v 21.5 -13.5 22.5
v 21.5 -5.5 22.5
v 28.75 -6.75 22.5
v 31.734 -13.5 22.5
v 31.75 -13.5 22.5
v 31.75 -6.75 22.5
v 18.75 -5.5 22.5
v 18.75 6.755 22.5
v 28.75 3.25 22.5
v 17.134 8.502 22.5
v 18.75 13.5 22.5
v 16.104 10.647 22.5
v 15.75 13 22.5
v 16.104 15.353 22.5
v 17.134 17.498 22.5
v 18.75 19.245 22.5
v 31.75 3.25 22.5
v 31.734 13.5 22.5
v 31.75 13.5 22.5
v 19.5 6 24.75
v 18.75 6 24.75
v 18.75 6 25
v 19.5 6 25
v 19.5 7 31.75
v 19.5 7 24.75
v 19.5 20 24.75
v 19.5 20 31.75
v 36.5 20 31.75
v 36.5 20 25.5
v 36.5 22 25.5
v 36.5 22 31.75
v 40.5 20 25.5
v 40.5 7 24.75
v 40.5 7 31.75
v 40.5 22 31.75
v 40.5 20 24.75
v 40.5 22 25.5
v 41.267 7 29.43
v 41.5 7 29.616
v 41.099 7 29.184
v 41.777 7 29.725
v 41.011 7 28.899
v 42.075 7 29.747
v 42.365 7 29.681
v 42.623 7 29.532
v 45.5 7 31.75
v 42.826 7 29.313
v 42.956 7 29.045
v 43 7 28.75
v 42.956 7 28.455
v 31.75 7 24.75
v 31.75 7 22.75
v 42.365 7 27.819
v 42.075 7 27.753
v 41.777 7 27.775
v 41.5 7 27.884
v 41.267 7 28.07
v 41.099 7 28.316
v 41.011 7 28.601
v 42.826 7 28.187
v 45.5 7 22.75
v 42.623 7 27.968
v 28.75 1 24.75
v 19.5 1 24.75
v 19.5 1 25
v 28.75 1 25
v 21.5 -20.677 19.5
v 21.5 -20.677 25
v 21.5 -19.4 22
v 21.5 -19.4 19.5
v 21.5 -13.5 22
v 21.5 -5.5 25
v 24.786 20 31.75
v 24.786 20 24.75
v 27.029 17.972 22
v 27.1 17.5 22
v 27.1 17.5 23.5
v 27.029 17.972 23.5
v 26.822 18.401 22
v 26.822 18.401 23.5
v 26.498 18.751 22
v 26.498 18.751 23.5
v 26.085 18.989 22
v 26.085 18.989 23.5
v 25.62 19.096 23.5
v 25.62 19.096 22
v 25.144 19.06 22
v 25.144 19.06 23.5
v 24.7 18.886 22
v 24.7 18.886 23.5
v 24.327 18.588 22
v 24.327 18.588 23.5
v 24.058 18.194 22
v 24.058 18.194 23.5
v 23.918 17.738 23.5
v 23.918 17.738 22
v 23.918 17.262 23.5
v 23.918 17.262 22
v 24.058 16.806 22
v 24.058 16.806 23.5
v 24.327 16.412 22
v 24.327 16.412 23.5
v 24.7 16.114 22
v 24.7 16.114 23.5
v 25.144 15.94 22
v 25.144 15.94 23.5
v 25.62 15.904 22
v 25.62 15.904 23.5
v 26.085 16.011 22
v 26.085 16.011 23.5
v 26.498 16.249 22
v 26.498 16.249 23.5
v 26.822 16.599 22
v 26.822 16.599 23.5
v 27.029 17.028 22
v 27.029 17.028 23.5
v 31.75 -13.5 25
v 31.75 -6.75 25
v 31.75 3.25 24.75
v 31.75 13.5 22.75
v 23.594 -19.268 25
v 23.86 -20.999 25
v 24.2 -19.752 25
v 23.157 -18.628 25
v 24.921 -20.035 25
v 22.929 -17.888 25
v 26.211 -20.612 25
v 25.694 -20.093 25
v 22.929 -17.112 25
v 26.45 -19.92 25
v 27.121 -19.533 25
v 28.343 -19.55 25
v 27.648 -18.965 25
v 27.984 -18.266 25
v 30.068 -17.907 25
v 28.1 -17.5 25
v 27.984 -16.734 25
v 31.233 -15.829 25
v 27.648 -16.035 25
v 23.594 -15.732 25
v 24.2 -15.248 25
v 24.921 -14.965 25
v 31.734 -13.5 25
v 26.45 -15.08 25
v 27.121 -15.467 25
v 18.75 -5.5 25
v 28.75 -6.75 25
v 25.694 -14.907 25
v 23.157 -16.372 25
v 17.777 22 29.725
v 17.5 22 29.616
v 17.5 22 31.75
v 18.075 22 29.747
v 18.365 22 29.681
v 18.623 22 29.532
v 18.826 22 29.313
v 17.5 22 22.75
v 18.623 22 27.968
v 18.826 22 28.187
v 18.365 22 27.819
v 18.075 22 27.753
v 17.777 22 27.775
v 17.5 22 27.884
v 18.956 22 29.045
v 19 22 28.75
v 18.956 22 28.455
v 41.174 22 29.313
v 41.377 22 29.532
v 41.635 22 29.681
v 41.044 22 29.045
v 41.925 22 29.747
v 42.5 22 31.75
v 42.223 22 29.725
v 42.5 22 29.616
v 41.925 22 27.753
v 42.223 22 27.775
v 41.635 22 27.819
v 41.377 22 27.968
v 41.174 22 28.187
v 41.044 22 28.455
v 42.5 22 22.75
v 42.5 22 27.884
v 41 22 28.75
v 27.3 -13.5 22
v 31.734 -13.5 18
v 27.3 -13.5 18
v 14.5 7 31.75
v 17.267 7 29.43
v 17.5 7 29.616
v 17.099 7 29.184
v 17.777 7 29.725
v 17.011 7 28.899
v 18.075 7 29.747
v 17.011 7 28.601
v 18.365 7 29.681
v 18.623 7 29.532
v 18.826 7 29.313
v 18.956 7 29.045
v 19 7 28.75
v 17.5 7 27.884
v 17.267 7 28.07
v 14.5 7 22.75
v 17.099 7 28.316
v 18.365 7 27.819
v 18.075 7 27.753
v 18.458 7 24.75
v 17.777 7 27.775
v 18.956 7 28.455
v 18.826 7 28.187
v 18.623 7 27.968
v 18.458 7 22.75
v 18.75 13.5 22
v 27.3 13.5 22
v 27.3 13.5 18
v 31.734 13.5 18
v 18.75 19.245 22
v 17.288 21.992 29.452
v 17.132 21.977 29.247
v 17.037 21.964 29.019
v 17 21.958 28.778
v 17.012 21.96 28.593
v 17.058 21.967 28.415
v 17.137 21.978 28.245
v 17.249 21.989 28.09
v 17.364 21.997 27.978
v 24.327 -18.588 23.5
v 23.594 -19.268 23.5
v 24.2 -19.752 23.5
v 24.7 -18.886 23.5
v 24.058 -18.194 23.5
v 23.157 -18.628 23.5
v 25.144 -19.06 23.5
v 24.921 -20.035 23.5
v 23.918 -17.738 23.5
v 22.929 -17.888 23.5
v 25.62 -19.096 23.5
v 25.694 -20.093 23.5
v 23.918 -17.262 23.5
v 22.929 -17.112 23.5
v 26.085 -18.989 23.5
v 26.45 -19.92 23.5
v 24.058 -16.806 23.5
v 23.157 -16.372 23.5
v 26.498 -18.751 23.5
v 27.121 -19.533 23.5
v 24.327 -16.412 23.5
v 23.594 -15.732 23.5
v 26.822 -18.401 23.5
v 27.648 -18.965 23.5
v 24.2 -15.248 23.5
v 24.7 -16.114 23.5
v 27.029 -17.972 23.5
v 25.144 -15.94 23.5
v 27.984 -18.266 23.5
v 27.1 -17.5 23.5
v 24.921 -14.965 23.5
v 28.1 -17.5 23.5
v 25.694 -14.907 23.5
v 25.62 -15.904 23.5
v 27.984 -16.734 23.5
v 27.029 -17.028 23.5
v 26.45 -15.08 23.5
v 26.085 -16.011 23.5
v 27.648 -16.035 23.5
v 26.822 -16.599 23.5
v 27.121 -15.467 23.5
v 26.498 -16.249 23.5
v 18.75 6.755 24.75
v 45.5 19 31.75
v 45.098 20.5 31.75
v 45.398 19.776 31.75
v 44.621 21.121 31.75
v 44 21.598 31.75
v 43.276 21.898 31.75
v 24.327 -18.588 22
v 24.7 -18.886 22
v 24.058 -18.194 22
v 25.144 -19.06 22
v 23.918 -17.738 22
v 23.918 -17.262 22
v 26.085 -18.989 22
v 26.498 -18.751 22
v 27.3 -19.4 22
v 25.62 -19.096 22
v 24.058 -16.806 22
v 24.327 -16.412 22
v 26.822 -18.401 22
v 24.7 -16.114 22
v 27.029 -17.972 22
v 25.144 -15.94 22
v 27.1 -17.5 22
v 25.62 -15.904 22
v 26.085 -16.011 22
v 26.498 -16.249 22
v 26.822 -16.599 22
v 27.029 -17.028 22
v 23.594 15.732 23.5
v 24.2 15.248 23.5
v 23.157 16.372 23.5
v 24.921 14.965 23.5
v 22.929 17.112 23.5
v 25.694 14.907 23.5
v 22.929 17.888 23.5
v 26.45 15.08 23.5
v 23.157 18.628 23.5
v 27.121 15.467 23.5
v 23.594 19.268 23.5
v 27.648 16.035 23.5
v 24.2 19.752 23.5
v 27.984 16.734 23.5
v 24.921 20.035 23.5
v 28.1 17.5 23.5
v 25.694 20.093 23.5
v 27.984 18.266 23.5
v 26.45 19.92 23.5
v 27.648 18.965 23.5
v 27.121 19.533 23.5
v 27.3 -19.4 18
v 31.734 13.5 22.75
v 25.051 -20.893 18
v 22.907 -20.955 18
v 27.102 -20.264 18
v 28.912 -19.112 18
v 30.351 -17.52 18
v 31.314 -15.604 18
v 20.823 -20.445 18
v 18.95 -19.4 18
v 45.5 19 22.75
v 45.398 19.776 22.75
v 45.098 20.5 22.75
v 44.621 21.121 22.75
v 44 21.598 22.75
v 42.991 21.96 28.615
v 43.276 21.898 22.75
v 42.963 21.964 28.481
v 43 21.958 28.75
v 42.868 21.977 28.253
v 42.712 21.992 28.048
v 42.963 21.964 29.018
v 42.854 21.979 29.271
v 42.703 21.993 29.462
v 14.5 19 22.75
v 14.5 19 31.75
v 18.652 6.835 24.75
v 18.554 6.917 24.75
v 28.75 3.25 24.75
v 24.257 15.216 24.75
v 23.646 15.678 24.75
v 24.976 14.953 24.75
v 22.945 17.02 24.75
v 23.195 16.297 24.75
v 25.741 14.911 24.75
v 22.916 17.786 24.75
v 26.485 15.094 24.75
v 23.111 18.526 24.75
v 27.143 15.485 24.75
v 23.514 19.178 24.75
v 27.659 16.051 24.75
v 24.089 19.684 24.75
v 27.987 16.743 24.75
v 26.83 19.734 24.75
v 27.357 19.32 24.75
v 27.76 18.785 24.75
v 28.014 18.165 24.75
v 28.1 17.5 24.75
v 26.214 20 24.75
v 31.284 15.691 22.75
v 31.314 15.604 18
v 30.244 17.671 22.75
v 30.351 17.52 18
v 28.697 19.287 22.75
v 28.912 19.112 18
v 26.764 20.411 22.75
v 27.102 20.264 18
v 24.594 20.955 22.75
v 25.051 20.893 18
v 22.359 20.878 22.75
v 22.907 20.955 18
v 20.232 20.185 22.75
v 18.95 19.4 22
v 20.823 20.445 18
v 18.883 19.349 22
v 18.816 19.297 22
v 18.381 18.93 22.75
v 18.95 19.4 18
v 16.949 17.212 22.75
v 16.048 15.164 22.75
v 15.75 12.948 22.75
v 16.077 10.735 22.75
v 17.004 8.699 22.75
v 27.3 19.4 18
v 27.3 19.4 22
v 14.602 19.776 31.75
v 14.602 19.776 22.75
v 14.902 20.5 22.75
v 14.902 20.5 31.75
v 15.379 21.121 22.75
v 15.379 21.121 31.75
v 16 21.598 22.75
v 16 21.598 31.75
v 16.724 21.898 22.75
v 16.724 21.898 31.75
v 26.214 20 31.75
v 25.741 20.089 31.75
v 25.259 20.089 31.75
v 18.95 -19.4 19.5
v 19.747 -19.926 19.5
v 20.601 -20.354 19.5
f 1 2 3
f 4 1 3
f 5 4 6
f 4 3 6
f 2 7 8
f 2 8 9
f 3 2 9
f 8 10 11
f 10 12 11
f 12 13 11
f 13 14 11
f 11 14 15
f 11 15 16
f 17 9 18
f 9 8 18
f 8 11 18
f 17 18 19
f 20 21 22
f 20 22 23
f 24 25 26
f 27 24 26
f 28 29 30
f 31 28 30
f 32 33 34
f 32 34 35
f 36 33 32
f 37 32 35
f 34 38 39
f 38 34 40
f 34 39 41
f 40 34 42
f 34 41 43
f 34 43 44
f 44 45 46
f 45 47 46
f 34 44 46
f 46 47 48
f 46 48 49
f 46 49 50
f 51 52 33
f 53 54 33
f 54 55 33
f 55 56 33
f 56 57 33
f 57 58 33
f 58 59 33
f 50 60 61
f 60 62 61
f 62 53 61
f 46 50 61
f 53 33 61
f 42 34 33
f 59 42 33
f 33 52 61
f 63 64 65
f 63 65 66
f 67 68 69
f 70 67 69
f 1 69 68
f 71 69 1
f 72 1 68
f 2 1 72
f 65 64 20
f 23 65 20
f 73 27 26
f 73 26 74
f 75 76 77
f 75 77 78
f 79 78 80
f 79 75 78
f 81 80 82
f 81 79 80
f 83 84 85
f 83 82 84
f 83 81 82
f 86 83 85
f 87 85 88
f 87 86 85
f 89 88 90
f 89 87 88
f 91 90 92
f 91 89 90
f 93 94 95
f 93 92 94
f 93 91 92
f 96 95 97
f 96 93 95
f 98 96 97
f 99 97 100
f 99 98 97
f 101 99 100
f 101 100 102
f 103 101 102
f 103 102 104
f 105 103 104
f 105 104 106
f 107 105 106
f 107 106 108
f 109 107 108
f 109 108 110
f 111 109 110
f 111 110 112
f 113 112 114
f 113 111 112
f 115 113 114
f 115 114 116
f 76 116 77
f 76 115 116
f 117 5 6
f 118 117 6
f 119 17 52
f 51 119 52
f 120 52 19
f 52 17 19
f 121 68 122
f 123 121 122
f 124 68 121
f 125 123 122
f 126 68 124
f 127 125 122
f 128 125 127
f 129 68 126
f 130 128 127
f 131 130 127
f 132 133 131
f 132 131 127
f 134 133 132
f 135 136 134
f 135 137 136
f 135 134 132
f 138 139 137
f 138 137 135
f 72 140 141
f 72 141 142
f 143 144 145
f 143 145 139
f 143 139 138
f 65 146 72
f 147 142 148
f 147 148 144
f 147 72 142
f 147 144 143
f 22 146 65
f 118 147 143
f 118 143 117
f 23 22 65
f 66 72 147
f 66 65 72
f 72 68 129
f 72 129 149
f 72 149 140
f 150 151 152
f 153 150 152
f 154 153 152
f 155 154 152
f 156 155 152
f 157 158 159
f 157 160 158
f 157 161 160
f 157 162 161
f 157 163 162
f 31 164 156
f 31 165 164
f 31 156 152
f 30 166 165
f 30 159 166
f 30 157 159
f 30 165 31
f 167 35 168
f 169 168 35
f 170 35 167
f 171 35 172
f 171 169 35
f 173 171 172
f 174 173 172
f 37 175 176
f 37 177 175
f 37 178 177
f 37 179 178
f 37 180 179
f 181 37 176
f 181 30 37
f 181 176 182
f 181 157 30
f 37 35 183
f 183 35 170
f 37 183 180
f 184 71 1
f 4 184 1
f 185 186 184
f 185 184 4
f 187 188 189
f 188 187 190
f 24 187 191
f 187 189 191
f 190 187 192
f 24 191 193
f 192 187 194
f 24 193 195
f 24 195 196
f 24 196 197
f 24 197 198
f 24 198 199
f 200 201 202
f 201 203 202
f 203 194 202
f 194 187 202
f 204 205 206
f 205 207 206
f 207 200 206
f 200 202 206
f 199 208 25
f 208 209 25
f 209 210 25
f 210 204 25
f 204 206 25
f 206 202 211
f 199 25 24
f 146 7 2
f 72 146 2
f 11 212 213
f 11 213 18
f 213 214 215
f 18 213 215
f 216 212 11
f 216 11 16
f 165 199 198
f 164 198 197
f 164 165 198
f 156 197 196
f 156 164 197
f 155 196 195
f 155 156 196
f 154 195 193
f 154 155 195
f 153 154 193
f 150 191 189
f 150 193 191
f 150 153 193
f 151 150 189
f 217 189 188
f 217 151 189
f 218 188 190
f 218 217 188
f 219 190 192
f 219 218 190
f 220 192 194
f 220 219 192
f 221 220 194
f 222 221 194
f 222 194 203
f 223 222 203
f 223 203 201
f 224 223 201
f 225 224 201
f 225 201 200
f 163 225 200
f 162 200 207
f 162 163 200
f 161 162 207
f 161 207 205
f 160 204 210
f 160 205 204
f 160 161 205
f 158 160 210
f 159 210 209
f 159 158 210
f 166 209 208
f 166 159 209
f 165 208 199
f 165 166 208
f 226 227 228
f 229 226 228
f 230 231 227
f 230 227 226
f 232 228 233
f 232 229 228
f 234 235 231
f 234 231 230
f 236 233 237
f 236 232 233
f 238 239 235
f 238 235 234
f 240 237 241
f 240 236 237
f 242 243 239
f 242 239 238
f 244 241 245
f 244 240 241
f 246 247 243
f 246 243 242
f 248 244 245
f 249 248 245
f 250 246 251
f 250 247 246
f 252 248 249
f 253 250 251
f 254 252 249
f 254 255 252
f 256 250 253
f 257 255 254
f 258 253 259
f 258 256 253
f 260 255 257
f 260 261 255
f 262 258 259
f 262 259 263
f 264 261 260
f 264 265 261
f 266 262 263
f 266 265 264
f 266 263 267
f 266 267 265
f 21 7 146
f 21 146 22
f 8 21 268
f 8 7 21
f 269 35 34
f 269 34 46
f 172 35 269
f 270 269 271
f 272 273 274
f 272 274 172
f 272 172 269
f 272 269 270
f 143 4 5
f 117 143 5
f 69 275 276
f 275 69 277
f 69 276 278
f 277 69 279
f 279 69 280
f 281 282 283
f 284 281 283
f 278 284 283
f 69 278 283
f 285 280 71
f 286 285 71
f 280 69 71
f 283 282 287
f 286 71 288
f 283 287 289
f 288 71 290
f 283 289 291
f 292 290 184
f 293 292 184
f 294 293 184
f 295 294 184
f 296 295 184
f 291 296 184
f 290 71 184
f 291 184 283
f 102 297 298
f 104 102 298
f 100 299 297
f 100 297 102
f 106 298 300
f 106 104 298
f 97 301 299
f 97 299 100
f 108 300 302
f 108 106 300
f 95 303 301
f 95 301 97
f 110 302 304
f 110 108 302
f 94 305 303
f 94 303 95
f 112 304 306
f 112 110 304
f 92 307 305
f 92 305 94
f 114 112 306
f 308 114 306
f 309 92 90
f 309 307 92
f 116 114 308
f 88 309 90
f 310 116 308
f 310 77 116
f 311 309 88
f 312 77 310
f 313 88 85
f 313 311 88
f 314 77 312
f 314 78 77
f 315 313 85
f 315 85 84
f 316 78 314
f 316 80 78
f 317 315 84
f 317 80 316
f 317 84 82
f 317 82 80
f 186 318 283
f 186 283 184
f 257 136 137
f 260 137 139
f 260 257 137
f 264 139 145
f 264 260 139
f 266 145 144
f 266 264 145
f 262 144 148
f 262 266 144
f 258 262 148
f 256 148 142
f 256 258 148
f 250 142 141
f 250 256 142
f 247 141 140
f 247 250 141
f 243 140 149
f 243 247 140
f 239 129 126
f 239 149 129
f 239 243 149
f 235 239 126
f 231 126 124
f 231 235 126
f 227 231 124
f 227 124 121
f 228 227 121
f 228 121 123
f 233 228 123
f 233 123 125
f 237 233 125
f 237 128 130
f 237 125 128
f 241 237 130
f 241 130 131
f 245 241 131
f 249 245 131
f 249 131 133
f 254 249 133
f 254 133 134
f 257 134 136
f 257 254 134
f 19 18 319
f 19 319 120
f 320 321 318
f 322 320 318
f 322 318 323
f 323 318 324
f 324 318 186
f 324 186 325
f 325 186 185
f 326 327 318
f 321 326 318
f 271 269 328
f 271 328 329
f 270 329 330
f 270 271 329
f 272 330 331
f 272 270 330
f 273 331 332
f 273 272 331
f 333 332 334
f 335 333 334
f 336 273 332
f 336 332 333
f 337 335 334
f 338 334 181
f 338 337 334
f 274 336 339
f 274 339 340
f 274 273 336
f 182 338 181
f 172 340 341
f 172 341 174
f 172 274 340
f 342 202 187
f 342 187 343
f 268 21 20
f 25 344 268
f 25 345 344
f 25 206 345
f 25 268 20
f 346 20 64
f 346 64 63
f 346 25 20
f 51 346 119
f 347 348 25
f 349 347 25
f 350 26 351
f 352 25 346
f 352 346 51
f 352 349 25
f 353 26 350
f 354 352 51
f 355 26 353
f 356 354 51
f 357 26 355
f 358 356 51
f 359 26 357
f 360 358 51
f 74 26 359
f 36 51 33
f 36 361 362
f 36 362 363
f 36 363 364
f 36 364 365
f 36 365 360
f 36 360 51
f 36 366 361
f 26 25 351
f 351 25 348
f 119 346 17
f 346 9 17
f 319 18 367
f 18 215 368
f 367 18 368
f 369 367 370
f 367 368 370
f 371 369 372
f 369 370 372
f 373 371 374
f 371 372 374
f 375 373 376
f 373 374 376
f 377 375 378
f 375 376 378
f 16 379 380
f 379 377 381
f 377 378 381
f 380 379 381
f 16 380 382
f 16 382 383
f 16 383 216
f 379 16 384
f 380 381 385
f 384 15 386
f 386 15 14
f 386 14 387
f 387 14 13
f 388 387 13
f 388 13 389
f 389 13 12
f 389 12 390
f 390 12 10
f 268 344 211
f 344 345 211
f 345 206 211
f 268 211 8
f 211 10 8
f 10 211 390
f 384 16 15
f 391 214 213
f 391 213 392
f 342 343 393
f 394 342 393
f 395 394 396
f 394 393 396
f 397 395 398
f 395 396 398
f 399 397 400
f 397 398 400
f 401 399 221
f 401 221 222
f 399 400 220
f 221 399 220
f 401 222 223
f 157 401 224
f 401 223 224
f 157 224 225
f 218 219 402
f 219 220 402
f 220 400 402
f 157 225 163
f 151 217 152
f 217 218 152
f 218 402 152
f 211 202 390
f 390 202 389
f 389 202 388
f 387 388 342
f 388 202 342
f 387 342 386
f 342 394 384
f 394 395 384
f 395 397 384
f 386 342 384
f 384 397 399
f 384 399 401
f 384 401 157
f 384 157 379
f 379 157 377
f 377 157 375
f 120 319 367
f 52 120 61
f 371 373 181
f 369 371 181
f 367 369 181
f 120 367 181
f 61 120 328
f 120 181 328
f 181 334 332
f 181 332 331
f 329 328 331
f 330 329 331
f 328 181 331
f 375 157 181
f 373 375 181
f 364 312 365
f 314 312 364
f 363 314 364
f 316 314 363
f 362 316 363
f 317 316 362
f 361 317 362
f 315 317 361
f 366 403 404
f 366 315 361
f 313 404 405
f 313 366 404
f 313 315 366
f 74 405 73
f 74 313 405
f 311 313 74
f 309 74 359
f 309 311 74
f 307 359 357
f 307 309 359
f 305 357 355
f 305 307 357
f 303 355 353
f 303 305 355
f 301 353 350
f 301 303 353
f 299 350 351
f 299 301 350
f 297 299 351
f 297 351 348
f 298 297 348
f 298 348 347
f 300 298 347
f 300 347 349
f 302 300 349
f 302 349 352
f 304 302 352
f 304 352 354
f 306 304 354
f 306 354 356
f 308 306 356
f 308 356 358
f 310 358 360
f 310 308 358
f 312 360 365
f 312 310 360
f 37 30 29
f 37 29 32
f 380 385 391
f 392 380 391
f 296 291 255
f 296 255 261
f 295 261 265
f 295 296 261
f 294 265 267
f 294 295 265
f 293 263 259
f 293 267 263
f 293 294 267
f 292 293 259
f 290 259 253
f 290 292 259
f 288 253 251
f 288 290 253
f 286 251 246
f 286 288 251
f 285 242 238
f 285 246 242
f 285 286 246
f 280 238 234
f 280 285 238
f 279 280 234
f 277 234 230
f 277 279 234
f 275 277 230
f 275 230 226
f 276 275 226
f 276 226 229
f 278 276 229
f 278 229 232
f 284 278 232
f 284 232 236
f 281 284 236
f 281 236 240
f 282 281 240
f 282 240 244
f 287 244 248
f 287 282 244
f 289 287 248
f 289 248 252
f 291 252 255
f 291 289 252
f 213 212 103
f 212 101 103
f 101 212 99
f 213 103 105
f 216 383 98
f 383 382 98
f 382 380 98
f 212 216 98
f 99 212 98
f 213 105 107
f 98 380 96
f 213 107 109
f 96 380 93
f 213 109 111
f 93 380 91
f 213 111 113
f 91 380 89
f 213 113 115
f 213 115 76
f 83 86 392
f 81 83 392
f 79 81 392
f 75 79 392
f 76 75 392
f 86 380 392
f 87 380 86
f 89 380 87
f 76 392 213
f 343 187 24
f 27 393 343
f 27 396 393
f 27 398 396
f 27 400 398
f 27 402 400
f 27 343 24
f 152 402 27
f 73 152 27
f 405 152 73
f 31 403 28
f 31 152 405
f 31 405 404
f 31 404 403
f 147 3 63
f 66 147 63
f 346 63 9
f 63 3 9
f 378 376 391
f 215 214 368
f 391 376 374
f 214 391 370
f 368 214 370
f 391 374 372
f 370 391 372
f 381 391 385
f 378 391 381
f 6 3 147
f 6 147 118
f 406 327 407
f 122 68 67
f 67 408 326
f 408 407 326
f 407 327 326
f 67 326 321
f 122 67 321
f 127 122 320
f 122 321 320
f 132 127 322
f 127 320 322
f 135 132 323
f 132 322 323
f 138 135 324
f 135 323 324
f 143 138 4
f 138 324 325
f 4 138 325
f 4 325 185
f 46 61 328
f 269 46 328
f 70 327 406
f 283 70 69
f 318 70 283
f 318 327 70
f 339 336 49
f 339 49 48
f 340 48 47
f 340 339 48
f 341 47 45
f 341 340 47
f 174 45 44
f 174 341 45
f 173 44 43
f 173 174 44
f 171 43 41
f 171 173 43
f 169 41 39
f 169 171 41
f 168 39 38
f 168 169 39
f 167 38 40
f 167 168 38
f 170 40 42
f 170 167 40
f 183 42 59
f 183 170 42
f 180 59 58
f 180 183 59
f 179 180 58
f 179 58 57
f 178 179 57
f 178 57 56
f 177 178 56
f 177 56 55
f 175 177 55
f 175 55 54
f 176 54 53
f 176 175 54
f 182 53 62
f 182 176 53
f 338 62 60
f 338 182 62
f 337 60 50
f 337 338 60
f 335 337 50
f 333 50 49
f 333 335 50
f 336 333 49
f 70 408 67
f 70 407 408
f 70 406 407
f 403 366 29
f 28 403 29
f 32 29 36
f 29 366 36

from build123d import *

# Parameters (mm, degrees)
CYLINDER298_R     = 1
CYLINDER298_DEPTH = 20
CYLINDER299_R     = 1
CYLINDER299_DEPTH = 20
BOX220_W          = 28
BOX220_H          = 1
BOX220_DEPTH      = 8
BOX197_W          = 21
BOX197_H          = 19
BOX197_DEPTH      = 8
BOX221_W          = 18
BOX221_H          = 27
BOX221_DEPTH      = 5.5
CYLINDER296_R     = 1.6
CYLINDER296_DEPTH = 10
CYLINDER297_R     = 1.6
CYLINDER297_DEPTH = 10
BOX224_W          = 69.8
BOX224_H          = 38.8
BOX224_DEPTH      = 4
CYLINDER300_R     = 2.6
CYLINDER300_DEPTH = 10
CYLINDER301_R     = 2.6
CYLINDER301_DEPTH = 10
BOX226_W          = 11
BOX226_H          = 17
BOX226_DEPTH      = 6
BOX227_W          = 4
BOX227_H          = 8
BOX227_DEPTH      = 11
BOX232_W          = 10
BOX232_H          = 10
BOX232_DEPTH      = 10
BOX222_W          = 10
BOX222_H          = 44
BOX222_DEPTH      = 3
CYLINDER295_R     = 8
CYLINDER295_DEPTH = 7
CYLINDER294_R     = 8
CYLINDER294_DEPTH = 7
BOX225_W          = 31
BOX225_H          = 15
BOX225_DEPTH      = 9
FILLET121_R       = 3
BOX223_W          = 13
BOX223_H          = 27
BOX223_DEPTH      = 2.5


with BuildPart() as zylinder300:
    # Cylinder298 → Cylinder298 (new body)
    with BuildSketch(Plane(origin=(22.5, 23, 30.5), x_dir=(1, 0, 0), z_dir=(0, -1, 0))):
        Circle(CYLINDER298_R)
    extrude(amount=CYLINDER298_DEPTH)


with BuildPart() as zylinder301:
    # Cylinder299 → Cylinder299 (new body)
    with BuildSketch(Plane(origin=(-1.5, 23, 30.5), x_dir=(1, 0, 0), z_dir=(0, -1, 0))):
        Circle(CYLINDER299_R)
    extrude(amount=CYLINDER299_DEPTH)


with BuildPart() as w_rfel208:
    # Box220 → Box220 (new body)
    with BuildSketch(Plane(origin=(-3, 5, 26.5), x_dir=(1, 0, 0), z_dir=(0, 0, 1))):
        with Locations((14, 0.5)):
            Rectangle(BOX220_W, BOX220_H)
    extrude(amount=BOX220_DEPTH)


with BuildPart() as fusion207:
    # Box197 → Box197 (new body)
    with BuildSketch(Plane.XY.offset(26.5)):
        with Locations((10.5, 9.5)):
            Rectangle(BOX197_W, BOX197_H)
    extrude(amount=BOX197_DEPTH)

    # Fusion206: union Würfel208
    add(w_rfel208.part)

    # Fusion207: union Zylinder300, Zylinder301
    add(zylinder300.part)
    add(zylinder301.part)


with BuildPart() as fusion207_1:
    # Fusion207 placement: moved
    add(fusion207.part.moved(Location((19.5, 1, -3.75))))


with BuildPart() as w_rfel209:
    # Box221 → Box221 (new body)
    with BuildSketch(Plane(origin=(14.5, -13.5, 15), x_dir=(1, 0, 0), z_dir=(0, 0, 1))):
        with Locations((9, 13.5)):
            Rectangle(BOX221_W, BOX221_H)
    extrude(amount=BOX221_DEPTH)


with BuildPart() as zylinder298:
    # Cylinder296 → Cylinder296 (new body)
    with BuildSketch(Plane(origin=(25.5, -17.5, 12.25), x_dir=(1, 0, 0), z_dir=(0, 0, 1))):
        Circle(CYLINDER296_R)
    extrude(amount=CYLINDER296_DEPTH)


with BuildPart() as zylinder299:
    # Cylinder297 → Cylinder297 (new body)
    with BuildSketch(Plane(origin=(25.5, 17.5, 13), x_dir=(1, 0, 0), z_dir=(0, 0, 1))):
        Circle(CYLINDER297_R)
    extrude(amount=CYLINDER297_DEPTH)


with BuildPart() as board005:
    # Box224 → Box224 (new body)
    with BuildSketch(Plane(origin=(-42.5, -19.4, 16), x_dir=(1, 0, 0), z_dir=(0, 0, 1))):
        with Locations((34.9, 19.4)):
            Rectangle(BOX224_W, BOX224_H)
    extrude(amount=BOX224_DEPTH)


with BuildPart() as zylinder302:
    # Cylinder300 → Cylinder300 (new body)
    with BuildSketch(Plane(origin=(25.5, -17.5, 21.5), x_dir=(1, 0, 0), z_dir=(0, 0, 1))):
        Circle(CYLINDER300_R)
    extrude(amount=CYLINDER300_DEPTH)


with BuildPart() as zylinder303:
    # Cylinder301 → Cylinder301 (new body)
    with BuildSketch(Plane(origin=(25.5, 17.5, 21.5), x_dir=(1, 0, 0), z_dir=(0, 0, 1))):
        Circle(CYLINDER301_R)
    extrude(amount=CYLINDER301_DEPTH)


with BuildPart() as w_rfel213:
    # Box226 → Box226 (new body)
    with BuildSketch(Plane(origin=(10.5, -22.5, 17.5), x_dir=(1, 0, 0), z_dir=(0, 0, 1))):
        with Locations((5.5, 8.5)):
            Rectangle(BOX226_W, BOX226_H)
    extrude(amount=BOX226_DEPTH)


with BuildPart() as w_rfel214:
    # Box227 → Box227 (new body)
    with BuildSketch(Plane(origin=(36.5, 18.25, 23.5), x_dir=(1, 0, 0), z_dir=(0, 0, 1))):
        with Locations((2, 4)):
            Rectangle(BOX227_W, BOX227_H)
    extrude(amount=BOX227_DEPTH)


with BuildPart() as w_rfel219:
    # Box232 → Box232 (new body)
    with BuildSketch(Plane(origin=(28.75, -6.75, 16.25), x_dir=(1, 0, 0), z_dir=(0, 0, 1))):
        with Locations((5, 5)):
            Rectangle(BOX232_W, BOX232_H)
    extrude(amount=BOX232_DEPTH)


with BuildPart() as fusion204:
    # Box222 → Box222 (new body)
    with BuildSketch(Plane(origin=(8.75, -22.5, 17.5), x_dir=(1, 0, 0), z_dir=(0, 0, 1))):
        with Locations((5, 22)):
            Rectangle(BOX222_W, BOX222_H)
    extrude(amount=BOX222_DEPTH)

    # Fusion204: union Würfel209, Zylinder298, Zylinder299, board005, Zylinder302, Zylinder303, Würfel213, Würfel214, Würfel219
    add(w_rfel209.part)
    add(zylinder298.part)
    add(zylinder299.part)
    add(board005.part)
    add(zylinder302.part)
    add(zylinder303.part)
    add(w_rfel213.part)
    add(w_rfel214.part)
    add(w_rfel219.part)


with BuildPart() as zylinder297:
    # Cylinder295 → Cylinder295 (new body)
    with BuildSketch(Plane(origin=(23.75, -13, 16), x_dir=(1, 0, 0), z_dir=(0, 0, 1))):
        Circle(CYLINDER295_R)
    extrude(amount=CYLINDER295_DEPTH)


with BuildPart() as zylinder296:
    # Cylinder294 → Cylinder294 (new body)
    with BuildSketch(Plane(origin=(23.75, 13, 16), x_dir=(1, 0, 0), z_dir=(0, 0, 1))):
        Circle(CYLINDER294_R)
    extrude(amount=CYLINDER294_DEPTH)


with BuildPart() as fillet121:
    # Box225 → Box225 (new body)
    with BuildSketch(Plane(origin=(14.5, 7, 20.75), x_dir=(1, 0, 0), z_dir=(0, 0, 1))):
        with Locations((15.5, 7.5)):
            Rectangle(BOX225_W, BOX225_H)
    extrude(amount=BOX225_DEPTH)

    # Fillet121
    fillet121_edges = [fillet121.edges().sort_by_distance(p)[0] for p in [
        (14.5, 22, 25.25),
        (45.5, 22, 25.25),
    ]]
    fillet(fillet121_edges, radius=FILLET121_R)


with BuildPart() as cut141:
    # Box223 → Box223 (new body)
    with BuildSketch(Plane(origin=(18.75, -13.5, 20.5), x_dir=(1, 0, 0), z_dir=(0, 0, 1))):
        with Locations((6.5, 13.5)):
            Rectangle(BOX223_W, BOX223_H)
    extrude(amount=BOX223_DEPTH)

    # Fusion205: union Zylinder297, Zylinder296, Fillet121
    add(zylinder297.part)
    add(zylinder296.part)
    add(fillet121.part)

    # Cut140: cut Fusion204
    add(fusion204.part, mode=Mode.SUBTRACT)

    # Cut141: cut Fusion207
    add(fusion207_1.part, mode=Mode.SUBTRACT)


with BuildPart() as cut141_1:
    # Cut141 placement: moved
    add(cut141.part.moved(Location((0, 0, 2))))


solid = cut141_1.part
